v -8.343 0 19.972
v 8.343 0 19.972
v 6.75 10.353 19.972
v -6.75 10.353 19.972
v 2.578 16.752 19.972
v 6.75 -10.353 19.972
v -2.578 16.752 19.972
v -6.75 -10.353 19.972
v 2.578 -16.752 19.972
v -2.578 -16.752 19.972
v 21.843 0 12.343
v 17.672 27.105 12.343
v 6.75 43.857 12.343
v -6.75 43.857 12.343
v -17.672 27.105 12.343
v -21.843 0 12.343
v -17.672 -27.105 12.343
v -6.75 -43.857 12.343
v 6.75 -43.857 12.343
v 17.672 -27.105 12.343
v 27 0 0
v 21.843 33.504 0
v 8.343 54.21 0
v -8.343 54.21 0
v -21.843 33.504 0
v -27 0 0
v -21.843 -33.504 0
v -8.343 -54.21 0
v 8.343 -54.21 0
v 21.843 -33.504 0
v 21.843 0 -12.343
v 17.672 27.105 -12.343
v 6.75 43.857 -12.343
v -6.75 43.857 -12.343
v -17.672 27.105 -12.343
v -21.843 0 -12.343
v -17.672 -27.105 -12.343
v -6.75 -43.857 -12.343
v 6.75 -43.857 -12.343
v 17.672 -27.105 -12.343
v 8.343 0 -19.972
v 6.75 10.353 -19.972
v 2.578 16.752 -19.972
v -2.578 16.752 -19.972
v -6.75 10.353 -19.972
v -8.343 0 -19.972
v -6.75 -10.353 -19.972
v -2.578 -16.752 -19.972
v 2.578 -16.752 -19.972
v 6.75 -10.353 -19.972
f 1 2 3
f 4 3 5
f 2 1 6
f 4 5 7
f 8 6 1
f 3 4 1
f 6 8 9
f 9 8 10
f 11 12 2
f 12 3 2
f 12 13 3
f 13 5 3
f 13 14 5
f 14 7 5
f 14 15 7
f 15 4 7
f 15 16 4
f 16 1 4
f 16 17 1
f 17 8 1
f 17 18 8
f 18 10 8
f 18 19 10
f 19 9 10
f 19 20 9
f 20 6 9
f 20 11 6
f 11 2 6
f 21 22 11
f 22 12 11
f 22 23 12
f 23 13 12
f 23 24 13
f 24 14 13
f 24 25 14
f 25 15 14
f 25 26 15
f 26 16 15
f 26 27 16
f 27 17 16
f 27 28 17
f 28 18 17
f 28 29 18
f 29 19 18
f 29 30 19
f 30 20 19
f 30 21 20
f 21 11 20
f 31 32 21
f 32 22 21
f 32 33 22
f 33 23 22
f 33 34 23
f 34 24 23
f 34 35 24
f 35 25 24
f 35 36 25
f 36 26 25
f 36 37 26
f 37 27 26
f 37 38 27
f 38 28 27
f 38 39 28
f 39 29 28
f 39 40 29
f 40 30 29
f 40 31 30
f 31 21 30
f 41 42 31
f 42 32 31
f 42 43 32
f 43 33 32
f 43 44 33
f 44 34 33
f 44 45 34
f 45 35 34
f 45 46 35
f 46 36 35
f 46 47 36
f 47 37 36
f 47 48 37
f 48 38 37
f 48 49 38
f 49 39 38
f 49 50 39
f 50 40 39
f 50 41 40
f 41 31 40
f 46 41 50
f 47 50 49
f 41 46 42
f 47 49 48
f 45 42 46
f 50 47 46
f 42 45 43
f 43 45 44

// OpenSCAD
// Generated by SolidPython 1.0.1 on 2020-07-29 00:46:49


scale(v = [9, 19, 7]) {
	sphere(r = 3);
}
/***********************************************
*********      SolidPython code:      **********
************************************************
 
# import packages: SolidPython
from solid import *
from solid.utils import *
from itertools import chain, combinations, permutations


class Resize:

    def __init__(self, scad_file):
        self.scad_file = scad_file
        #self.scad_file = import_scad(scad_file)
        # cone/cylinder param:
        self.r1 = 0
        self.r2 = 0
        self.h = 0
        # rectangular prism param:
        self.w = 0
        self.l = 0
        # ellipse param:
        self.r = 0

    # import OpenScad code (file name corresponds to shape)


    # classify shape + parameters
    def assign(self, param1, param2, param3):
        if self.scad_file == 'cone.scad':
            self.r1 = param1
            self.r2 = param2
            self.h = param3
        elif self.scad_file == 'cylinder.scad':
            self.r1 = param1
            self.r2 = param2
            self.h = param3
        elif self.scad_file == 'rectangularPrism.scad':
            self.h = param1
            self.l = param2
            self.w = param3
        else:
            self.r = param1
            self.h = param2

    # resize parameters
    def iterate(self):
        x = range(3, 20, 2)
        i = 1
        if self.scad_file == 'cone.scad':
            tempList = list(permutations(x, 2))
            for temp in tempList:
                param1 = temp[0]
                param2 = temp[1]
                filepath = 'produced_scad_files/' + 'cone' + str(param1) + '_' + str(param2) + '_' + '.scad'
                scad_render_to_file(cylinder(h=param1, r1=param2, r2=0), filepath)

        elif self.scad_file == 'cylinder.scad':
            tempList = list(permutations(x, 3))
            for temp in tempList:
                param1 = temp[0]
                param2 = temp[1]
                filepath = 'produced_scad_files/' + 'cylinder' + str(param1) + '_' + str(param2) + '_' + '.scad'
                scad_render_to_file(cylinder(h=param1, r1=param2, r2=param2), filepath)

        elif self.scad_file == 'rectangularPrism.scad':
            tempList = list(permutations(x, 3))
            for temp in tempList:
                param1 = temp[0]
                param2 = temp[1]
                param3 = temp[2]
                filepath = 'produced_scad_files/' + 'rectangularPrism' + str(param1) + '_' + str(param2) + '_' + str(
                    param3) + '.scad'
                scad_render_to_file(cube(size=(param1, param2, param3)), filepath)

        elif self.scad_file == 'ellipse.scad':
            tempList = list(permutations(x, 4))
            for temp in tempList:
                param1 = temp[0]
                param2 = temp[1]
                param3 = temp[2]
                param4 = temp[3]
                filepath = 'produced_scad_files/' + 'ellipse' + str(param1) + '_' + str(param2) + '_' + str(param3) + '_' + str(param4) + '.scad'
                scad_render_to_file(scale([param1, param2, param3])(sphere(r=param4)), filepath)

    def render_to_scadfile(self):
        scad_render_to_file(scad, 'example.scad') 
 
************************************************/
